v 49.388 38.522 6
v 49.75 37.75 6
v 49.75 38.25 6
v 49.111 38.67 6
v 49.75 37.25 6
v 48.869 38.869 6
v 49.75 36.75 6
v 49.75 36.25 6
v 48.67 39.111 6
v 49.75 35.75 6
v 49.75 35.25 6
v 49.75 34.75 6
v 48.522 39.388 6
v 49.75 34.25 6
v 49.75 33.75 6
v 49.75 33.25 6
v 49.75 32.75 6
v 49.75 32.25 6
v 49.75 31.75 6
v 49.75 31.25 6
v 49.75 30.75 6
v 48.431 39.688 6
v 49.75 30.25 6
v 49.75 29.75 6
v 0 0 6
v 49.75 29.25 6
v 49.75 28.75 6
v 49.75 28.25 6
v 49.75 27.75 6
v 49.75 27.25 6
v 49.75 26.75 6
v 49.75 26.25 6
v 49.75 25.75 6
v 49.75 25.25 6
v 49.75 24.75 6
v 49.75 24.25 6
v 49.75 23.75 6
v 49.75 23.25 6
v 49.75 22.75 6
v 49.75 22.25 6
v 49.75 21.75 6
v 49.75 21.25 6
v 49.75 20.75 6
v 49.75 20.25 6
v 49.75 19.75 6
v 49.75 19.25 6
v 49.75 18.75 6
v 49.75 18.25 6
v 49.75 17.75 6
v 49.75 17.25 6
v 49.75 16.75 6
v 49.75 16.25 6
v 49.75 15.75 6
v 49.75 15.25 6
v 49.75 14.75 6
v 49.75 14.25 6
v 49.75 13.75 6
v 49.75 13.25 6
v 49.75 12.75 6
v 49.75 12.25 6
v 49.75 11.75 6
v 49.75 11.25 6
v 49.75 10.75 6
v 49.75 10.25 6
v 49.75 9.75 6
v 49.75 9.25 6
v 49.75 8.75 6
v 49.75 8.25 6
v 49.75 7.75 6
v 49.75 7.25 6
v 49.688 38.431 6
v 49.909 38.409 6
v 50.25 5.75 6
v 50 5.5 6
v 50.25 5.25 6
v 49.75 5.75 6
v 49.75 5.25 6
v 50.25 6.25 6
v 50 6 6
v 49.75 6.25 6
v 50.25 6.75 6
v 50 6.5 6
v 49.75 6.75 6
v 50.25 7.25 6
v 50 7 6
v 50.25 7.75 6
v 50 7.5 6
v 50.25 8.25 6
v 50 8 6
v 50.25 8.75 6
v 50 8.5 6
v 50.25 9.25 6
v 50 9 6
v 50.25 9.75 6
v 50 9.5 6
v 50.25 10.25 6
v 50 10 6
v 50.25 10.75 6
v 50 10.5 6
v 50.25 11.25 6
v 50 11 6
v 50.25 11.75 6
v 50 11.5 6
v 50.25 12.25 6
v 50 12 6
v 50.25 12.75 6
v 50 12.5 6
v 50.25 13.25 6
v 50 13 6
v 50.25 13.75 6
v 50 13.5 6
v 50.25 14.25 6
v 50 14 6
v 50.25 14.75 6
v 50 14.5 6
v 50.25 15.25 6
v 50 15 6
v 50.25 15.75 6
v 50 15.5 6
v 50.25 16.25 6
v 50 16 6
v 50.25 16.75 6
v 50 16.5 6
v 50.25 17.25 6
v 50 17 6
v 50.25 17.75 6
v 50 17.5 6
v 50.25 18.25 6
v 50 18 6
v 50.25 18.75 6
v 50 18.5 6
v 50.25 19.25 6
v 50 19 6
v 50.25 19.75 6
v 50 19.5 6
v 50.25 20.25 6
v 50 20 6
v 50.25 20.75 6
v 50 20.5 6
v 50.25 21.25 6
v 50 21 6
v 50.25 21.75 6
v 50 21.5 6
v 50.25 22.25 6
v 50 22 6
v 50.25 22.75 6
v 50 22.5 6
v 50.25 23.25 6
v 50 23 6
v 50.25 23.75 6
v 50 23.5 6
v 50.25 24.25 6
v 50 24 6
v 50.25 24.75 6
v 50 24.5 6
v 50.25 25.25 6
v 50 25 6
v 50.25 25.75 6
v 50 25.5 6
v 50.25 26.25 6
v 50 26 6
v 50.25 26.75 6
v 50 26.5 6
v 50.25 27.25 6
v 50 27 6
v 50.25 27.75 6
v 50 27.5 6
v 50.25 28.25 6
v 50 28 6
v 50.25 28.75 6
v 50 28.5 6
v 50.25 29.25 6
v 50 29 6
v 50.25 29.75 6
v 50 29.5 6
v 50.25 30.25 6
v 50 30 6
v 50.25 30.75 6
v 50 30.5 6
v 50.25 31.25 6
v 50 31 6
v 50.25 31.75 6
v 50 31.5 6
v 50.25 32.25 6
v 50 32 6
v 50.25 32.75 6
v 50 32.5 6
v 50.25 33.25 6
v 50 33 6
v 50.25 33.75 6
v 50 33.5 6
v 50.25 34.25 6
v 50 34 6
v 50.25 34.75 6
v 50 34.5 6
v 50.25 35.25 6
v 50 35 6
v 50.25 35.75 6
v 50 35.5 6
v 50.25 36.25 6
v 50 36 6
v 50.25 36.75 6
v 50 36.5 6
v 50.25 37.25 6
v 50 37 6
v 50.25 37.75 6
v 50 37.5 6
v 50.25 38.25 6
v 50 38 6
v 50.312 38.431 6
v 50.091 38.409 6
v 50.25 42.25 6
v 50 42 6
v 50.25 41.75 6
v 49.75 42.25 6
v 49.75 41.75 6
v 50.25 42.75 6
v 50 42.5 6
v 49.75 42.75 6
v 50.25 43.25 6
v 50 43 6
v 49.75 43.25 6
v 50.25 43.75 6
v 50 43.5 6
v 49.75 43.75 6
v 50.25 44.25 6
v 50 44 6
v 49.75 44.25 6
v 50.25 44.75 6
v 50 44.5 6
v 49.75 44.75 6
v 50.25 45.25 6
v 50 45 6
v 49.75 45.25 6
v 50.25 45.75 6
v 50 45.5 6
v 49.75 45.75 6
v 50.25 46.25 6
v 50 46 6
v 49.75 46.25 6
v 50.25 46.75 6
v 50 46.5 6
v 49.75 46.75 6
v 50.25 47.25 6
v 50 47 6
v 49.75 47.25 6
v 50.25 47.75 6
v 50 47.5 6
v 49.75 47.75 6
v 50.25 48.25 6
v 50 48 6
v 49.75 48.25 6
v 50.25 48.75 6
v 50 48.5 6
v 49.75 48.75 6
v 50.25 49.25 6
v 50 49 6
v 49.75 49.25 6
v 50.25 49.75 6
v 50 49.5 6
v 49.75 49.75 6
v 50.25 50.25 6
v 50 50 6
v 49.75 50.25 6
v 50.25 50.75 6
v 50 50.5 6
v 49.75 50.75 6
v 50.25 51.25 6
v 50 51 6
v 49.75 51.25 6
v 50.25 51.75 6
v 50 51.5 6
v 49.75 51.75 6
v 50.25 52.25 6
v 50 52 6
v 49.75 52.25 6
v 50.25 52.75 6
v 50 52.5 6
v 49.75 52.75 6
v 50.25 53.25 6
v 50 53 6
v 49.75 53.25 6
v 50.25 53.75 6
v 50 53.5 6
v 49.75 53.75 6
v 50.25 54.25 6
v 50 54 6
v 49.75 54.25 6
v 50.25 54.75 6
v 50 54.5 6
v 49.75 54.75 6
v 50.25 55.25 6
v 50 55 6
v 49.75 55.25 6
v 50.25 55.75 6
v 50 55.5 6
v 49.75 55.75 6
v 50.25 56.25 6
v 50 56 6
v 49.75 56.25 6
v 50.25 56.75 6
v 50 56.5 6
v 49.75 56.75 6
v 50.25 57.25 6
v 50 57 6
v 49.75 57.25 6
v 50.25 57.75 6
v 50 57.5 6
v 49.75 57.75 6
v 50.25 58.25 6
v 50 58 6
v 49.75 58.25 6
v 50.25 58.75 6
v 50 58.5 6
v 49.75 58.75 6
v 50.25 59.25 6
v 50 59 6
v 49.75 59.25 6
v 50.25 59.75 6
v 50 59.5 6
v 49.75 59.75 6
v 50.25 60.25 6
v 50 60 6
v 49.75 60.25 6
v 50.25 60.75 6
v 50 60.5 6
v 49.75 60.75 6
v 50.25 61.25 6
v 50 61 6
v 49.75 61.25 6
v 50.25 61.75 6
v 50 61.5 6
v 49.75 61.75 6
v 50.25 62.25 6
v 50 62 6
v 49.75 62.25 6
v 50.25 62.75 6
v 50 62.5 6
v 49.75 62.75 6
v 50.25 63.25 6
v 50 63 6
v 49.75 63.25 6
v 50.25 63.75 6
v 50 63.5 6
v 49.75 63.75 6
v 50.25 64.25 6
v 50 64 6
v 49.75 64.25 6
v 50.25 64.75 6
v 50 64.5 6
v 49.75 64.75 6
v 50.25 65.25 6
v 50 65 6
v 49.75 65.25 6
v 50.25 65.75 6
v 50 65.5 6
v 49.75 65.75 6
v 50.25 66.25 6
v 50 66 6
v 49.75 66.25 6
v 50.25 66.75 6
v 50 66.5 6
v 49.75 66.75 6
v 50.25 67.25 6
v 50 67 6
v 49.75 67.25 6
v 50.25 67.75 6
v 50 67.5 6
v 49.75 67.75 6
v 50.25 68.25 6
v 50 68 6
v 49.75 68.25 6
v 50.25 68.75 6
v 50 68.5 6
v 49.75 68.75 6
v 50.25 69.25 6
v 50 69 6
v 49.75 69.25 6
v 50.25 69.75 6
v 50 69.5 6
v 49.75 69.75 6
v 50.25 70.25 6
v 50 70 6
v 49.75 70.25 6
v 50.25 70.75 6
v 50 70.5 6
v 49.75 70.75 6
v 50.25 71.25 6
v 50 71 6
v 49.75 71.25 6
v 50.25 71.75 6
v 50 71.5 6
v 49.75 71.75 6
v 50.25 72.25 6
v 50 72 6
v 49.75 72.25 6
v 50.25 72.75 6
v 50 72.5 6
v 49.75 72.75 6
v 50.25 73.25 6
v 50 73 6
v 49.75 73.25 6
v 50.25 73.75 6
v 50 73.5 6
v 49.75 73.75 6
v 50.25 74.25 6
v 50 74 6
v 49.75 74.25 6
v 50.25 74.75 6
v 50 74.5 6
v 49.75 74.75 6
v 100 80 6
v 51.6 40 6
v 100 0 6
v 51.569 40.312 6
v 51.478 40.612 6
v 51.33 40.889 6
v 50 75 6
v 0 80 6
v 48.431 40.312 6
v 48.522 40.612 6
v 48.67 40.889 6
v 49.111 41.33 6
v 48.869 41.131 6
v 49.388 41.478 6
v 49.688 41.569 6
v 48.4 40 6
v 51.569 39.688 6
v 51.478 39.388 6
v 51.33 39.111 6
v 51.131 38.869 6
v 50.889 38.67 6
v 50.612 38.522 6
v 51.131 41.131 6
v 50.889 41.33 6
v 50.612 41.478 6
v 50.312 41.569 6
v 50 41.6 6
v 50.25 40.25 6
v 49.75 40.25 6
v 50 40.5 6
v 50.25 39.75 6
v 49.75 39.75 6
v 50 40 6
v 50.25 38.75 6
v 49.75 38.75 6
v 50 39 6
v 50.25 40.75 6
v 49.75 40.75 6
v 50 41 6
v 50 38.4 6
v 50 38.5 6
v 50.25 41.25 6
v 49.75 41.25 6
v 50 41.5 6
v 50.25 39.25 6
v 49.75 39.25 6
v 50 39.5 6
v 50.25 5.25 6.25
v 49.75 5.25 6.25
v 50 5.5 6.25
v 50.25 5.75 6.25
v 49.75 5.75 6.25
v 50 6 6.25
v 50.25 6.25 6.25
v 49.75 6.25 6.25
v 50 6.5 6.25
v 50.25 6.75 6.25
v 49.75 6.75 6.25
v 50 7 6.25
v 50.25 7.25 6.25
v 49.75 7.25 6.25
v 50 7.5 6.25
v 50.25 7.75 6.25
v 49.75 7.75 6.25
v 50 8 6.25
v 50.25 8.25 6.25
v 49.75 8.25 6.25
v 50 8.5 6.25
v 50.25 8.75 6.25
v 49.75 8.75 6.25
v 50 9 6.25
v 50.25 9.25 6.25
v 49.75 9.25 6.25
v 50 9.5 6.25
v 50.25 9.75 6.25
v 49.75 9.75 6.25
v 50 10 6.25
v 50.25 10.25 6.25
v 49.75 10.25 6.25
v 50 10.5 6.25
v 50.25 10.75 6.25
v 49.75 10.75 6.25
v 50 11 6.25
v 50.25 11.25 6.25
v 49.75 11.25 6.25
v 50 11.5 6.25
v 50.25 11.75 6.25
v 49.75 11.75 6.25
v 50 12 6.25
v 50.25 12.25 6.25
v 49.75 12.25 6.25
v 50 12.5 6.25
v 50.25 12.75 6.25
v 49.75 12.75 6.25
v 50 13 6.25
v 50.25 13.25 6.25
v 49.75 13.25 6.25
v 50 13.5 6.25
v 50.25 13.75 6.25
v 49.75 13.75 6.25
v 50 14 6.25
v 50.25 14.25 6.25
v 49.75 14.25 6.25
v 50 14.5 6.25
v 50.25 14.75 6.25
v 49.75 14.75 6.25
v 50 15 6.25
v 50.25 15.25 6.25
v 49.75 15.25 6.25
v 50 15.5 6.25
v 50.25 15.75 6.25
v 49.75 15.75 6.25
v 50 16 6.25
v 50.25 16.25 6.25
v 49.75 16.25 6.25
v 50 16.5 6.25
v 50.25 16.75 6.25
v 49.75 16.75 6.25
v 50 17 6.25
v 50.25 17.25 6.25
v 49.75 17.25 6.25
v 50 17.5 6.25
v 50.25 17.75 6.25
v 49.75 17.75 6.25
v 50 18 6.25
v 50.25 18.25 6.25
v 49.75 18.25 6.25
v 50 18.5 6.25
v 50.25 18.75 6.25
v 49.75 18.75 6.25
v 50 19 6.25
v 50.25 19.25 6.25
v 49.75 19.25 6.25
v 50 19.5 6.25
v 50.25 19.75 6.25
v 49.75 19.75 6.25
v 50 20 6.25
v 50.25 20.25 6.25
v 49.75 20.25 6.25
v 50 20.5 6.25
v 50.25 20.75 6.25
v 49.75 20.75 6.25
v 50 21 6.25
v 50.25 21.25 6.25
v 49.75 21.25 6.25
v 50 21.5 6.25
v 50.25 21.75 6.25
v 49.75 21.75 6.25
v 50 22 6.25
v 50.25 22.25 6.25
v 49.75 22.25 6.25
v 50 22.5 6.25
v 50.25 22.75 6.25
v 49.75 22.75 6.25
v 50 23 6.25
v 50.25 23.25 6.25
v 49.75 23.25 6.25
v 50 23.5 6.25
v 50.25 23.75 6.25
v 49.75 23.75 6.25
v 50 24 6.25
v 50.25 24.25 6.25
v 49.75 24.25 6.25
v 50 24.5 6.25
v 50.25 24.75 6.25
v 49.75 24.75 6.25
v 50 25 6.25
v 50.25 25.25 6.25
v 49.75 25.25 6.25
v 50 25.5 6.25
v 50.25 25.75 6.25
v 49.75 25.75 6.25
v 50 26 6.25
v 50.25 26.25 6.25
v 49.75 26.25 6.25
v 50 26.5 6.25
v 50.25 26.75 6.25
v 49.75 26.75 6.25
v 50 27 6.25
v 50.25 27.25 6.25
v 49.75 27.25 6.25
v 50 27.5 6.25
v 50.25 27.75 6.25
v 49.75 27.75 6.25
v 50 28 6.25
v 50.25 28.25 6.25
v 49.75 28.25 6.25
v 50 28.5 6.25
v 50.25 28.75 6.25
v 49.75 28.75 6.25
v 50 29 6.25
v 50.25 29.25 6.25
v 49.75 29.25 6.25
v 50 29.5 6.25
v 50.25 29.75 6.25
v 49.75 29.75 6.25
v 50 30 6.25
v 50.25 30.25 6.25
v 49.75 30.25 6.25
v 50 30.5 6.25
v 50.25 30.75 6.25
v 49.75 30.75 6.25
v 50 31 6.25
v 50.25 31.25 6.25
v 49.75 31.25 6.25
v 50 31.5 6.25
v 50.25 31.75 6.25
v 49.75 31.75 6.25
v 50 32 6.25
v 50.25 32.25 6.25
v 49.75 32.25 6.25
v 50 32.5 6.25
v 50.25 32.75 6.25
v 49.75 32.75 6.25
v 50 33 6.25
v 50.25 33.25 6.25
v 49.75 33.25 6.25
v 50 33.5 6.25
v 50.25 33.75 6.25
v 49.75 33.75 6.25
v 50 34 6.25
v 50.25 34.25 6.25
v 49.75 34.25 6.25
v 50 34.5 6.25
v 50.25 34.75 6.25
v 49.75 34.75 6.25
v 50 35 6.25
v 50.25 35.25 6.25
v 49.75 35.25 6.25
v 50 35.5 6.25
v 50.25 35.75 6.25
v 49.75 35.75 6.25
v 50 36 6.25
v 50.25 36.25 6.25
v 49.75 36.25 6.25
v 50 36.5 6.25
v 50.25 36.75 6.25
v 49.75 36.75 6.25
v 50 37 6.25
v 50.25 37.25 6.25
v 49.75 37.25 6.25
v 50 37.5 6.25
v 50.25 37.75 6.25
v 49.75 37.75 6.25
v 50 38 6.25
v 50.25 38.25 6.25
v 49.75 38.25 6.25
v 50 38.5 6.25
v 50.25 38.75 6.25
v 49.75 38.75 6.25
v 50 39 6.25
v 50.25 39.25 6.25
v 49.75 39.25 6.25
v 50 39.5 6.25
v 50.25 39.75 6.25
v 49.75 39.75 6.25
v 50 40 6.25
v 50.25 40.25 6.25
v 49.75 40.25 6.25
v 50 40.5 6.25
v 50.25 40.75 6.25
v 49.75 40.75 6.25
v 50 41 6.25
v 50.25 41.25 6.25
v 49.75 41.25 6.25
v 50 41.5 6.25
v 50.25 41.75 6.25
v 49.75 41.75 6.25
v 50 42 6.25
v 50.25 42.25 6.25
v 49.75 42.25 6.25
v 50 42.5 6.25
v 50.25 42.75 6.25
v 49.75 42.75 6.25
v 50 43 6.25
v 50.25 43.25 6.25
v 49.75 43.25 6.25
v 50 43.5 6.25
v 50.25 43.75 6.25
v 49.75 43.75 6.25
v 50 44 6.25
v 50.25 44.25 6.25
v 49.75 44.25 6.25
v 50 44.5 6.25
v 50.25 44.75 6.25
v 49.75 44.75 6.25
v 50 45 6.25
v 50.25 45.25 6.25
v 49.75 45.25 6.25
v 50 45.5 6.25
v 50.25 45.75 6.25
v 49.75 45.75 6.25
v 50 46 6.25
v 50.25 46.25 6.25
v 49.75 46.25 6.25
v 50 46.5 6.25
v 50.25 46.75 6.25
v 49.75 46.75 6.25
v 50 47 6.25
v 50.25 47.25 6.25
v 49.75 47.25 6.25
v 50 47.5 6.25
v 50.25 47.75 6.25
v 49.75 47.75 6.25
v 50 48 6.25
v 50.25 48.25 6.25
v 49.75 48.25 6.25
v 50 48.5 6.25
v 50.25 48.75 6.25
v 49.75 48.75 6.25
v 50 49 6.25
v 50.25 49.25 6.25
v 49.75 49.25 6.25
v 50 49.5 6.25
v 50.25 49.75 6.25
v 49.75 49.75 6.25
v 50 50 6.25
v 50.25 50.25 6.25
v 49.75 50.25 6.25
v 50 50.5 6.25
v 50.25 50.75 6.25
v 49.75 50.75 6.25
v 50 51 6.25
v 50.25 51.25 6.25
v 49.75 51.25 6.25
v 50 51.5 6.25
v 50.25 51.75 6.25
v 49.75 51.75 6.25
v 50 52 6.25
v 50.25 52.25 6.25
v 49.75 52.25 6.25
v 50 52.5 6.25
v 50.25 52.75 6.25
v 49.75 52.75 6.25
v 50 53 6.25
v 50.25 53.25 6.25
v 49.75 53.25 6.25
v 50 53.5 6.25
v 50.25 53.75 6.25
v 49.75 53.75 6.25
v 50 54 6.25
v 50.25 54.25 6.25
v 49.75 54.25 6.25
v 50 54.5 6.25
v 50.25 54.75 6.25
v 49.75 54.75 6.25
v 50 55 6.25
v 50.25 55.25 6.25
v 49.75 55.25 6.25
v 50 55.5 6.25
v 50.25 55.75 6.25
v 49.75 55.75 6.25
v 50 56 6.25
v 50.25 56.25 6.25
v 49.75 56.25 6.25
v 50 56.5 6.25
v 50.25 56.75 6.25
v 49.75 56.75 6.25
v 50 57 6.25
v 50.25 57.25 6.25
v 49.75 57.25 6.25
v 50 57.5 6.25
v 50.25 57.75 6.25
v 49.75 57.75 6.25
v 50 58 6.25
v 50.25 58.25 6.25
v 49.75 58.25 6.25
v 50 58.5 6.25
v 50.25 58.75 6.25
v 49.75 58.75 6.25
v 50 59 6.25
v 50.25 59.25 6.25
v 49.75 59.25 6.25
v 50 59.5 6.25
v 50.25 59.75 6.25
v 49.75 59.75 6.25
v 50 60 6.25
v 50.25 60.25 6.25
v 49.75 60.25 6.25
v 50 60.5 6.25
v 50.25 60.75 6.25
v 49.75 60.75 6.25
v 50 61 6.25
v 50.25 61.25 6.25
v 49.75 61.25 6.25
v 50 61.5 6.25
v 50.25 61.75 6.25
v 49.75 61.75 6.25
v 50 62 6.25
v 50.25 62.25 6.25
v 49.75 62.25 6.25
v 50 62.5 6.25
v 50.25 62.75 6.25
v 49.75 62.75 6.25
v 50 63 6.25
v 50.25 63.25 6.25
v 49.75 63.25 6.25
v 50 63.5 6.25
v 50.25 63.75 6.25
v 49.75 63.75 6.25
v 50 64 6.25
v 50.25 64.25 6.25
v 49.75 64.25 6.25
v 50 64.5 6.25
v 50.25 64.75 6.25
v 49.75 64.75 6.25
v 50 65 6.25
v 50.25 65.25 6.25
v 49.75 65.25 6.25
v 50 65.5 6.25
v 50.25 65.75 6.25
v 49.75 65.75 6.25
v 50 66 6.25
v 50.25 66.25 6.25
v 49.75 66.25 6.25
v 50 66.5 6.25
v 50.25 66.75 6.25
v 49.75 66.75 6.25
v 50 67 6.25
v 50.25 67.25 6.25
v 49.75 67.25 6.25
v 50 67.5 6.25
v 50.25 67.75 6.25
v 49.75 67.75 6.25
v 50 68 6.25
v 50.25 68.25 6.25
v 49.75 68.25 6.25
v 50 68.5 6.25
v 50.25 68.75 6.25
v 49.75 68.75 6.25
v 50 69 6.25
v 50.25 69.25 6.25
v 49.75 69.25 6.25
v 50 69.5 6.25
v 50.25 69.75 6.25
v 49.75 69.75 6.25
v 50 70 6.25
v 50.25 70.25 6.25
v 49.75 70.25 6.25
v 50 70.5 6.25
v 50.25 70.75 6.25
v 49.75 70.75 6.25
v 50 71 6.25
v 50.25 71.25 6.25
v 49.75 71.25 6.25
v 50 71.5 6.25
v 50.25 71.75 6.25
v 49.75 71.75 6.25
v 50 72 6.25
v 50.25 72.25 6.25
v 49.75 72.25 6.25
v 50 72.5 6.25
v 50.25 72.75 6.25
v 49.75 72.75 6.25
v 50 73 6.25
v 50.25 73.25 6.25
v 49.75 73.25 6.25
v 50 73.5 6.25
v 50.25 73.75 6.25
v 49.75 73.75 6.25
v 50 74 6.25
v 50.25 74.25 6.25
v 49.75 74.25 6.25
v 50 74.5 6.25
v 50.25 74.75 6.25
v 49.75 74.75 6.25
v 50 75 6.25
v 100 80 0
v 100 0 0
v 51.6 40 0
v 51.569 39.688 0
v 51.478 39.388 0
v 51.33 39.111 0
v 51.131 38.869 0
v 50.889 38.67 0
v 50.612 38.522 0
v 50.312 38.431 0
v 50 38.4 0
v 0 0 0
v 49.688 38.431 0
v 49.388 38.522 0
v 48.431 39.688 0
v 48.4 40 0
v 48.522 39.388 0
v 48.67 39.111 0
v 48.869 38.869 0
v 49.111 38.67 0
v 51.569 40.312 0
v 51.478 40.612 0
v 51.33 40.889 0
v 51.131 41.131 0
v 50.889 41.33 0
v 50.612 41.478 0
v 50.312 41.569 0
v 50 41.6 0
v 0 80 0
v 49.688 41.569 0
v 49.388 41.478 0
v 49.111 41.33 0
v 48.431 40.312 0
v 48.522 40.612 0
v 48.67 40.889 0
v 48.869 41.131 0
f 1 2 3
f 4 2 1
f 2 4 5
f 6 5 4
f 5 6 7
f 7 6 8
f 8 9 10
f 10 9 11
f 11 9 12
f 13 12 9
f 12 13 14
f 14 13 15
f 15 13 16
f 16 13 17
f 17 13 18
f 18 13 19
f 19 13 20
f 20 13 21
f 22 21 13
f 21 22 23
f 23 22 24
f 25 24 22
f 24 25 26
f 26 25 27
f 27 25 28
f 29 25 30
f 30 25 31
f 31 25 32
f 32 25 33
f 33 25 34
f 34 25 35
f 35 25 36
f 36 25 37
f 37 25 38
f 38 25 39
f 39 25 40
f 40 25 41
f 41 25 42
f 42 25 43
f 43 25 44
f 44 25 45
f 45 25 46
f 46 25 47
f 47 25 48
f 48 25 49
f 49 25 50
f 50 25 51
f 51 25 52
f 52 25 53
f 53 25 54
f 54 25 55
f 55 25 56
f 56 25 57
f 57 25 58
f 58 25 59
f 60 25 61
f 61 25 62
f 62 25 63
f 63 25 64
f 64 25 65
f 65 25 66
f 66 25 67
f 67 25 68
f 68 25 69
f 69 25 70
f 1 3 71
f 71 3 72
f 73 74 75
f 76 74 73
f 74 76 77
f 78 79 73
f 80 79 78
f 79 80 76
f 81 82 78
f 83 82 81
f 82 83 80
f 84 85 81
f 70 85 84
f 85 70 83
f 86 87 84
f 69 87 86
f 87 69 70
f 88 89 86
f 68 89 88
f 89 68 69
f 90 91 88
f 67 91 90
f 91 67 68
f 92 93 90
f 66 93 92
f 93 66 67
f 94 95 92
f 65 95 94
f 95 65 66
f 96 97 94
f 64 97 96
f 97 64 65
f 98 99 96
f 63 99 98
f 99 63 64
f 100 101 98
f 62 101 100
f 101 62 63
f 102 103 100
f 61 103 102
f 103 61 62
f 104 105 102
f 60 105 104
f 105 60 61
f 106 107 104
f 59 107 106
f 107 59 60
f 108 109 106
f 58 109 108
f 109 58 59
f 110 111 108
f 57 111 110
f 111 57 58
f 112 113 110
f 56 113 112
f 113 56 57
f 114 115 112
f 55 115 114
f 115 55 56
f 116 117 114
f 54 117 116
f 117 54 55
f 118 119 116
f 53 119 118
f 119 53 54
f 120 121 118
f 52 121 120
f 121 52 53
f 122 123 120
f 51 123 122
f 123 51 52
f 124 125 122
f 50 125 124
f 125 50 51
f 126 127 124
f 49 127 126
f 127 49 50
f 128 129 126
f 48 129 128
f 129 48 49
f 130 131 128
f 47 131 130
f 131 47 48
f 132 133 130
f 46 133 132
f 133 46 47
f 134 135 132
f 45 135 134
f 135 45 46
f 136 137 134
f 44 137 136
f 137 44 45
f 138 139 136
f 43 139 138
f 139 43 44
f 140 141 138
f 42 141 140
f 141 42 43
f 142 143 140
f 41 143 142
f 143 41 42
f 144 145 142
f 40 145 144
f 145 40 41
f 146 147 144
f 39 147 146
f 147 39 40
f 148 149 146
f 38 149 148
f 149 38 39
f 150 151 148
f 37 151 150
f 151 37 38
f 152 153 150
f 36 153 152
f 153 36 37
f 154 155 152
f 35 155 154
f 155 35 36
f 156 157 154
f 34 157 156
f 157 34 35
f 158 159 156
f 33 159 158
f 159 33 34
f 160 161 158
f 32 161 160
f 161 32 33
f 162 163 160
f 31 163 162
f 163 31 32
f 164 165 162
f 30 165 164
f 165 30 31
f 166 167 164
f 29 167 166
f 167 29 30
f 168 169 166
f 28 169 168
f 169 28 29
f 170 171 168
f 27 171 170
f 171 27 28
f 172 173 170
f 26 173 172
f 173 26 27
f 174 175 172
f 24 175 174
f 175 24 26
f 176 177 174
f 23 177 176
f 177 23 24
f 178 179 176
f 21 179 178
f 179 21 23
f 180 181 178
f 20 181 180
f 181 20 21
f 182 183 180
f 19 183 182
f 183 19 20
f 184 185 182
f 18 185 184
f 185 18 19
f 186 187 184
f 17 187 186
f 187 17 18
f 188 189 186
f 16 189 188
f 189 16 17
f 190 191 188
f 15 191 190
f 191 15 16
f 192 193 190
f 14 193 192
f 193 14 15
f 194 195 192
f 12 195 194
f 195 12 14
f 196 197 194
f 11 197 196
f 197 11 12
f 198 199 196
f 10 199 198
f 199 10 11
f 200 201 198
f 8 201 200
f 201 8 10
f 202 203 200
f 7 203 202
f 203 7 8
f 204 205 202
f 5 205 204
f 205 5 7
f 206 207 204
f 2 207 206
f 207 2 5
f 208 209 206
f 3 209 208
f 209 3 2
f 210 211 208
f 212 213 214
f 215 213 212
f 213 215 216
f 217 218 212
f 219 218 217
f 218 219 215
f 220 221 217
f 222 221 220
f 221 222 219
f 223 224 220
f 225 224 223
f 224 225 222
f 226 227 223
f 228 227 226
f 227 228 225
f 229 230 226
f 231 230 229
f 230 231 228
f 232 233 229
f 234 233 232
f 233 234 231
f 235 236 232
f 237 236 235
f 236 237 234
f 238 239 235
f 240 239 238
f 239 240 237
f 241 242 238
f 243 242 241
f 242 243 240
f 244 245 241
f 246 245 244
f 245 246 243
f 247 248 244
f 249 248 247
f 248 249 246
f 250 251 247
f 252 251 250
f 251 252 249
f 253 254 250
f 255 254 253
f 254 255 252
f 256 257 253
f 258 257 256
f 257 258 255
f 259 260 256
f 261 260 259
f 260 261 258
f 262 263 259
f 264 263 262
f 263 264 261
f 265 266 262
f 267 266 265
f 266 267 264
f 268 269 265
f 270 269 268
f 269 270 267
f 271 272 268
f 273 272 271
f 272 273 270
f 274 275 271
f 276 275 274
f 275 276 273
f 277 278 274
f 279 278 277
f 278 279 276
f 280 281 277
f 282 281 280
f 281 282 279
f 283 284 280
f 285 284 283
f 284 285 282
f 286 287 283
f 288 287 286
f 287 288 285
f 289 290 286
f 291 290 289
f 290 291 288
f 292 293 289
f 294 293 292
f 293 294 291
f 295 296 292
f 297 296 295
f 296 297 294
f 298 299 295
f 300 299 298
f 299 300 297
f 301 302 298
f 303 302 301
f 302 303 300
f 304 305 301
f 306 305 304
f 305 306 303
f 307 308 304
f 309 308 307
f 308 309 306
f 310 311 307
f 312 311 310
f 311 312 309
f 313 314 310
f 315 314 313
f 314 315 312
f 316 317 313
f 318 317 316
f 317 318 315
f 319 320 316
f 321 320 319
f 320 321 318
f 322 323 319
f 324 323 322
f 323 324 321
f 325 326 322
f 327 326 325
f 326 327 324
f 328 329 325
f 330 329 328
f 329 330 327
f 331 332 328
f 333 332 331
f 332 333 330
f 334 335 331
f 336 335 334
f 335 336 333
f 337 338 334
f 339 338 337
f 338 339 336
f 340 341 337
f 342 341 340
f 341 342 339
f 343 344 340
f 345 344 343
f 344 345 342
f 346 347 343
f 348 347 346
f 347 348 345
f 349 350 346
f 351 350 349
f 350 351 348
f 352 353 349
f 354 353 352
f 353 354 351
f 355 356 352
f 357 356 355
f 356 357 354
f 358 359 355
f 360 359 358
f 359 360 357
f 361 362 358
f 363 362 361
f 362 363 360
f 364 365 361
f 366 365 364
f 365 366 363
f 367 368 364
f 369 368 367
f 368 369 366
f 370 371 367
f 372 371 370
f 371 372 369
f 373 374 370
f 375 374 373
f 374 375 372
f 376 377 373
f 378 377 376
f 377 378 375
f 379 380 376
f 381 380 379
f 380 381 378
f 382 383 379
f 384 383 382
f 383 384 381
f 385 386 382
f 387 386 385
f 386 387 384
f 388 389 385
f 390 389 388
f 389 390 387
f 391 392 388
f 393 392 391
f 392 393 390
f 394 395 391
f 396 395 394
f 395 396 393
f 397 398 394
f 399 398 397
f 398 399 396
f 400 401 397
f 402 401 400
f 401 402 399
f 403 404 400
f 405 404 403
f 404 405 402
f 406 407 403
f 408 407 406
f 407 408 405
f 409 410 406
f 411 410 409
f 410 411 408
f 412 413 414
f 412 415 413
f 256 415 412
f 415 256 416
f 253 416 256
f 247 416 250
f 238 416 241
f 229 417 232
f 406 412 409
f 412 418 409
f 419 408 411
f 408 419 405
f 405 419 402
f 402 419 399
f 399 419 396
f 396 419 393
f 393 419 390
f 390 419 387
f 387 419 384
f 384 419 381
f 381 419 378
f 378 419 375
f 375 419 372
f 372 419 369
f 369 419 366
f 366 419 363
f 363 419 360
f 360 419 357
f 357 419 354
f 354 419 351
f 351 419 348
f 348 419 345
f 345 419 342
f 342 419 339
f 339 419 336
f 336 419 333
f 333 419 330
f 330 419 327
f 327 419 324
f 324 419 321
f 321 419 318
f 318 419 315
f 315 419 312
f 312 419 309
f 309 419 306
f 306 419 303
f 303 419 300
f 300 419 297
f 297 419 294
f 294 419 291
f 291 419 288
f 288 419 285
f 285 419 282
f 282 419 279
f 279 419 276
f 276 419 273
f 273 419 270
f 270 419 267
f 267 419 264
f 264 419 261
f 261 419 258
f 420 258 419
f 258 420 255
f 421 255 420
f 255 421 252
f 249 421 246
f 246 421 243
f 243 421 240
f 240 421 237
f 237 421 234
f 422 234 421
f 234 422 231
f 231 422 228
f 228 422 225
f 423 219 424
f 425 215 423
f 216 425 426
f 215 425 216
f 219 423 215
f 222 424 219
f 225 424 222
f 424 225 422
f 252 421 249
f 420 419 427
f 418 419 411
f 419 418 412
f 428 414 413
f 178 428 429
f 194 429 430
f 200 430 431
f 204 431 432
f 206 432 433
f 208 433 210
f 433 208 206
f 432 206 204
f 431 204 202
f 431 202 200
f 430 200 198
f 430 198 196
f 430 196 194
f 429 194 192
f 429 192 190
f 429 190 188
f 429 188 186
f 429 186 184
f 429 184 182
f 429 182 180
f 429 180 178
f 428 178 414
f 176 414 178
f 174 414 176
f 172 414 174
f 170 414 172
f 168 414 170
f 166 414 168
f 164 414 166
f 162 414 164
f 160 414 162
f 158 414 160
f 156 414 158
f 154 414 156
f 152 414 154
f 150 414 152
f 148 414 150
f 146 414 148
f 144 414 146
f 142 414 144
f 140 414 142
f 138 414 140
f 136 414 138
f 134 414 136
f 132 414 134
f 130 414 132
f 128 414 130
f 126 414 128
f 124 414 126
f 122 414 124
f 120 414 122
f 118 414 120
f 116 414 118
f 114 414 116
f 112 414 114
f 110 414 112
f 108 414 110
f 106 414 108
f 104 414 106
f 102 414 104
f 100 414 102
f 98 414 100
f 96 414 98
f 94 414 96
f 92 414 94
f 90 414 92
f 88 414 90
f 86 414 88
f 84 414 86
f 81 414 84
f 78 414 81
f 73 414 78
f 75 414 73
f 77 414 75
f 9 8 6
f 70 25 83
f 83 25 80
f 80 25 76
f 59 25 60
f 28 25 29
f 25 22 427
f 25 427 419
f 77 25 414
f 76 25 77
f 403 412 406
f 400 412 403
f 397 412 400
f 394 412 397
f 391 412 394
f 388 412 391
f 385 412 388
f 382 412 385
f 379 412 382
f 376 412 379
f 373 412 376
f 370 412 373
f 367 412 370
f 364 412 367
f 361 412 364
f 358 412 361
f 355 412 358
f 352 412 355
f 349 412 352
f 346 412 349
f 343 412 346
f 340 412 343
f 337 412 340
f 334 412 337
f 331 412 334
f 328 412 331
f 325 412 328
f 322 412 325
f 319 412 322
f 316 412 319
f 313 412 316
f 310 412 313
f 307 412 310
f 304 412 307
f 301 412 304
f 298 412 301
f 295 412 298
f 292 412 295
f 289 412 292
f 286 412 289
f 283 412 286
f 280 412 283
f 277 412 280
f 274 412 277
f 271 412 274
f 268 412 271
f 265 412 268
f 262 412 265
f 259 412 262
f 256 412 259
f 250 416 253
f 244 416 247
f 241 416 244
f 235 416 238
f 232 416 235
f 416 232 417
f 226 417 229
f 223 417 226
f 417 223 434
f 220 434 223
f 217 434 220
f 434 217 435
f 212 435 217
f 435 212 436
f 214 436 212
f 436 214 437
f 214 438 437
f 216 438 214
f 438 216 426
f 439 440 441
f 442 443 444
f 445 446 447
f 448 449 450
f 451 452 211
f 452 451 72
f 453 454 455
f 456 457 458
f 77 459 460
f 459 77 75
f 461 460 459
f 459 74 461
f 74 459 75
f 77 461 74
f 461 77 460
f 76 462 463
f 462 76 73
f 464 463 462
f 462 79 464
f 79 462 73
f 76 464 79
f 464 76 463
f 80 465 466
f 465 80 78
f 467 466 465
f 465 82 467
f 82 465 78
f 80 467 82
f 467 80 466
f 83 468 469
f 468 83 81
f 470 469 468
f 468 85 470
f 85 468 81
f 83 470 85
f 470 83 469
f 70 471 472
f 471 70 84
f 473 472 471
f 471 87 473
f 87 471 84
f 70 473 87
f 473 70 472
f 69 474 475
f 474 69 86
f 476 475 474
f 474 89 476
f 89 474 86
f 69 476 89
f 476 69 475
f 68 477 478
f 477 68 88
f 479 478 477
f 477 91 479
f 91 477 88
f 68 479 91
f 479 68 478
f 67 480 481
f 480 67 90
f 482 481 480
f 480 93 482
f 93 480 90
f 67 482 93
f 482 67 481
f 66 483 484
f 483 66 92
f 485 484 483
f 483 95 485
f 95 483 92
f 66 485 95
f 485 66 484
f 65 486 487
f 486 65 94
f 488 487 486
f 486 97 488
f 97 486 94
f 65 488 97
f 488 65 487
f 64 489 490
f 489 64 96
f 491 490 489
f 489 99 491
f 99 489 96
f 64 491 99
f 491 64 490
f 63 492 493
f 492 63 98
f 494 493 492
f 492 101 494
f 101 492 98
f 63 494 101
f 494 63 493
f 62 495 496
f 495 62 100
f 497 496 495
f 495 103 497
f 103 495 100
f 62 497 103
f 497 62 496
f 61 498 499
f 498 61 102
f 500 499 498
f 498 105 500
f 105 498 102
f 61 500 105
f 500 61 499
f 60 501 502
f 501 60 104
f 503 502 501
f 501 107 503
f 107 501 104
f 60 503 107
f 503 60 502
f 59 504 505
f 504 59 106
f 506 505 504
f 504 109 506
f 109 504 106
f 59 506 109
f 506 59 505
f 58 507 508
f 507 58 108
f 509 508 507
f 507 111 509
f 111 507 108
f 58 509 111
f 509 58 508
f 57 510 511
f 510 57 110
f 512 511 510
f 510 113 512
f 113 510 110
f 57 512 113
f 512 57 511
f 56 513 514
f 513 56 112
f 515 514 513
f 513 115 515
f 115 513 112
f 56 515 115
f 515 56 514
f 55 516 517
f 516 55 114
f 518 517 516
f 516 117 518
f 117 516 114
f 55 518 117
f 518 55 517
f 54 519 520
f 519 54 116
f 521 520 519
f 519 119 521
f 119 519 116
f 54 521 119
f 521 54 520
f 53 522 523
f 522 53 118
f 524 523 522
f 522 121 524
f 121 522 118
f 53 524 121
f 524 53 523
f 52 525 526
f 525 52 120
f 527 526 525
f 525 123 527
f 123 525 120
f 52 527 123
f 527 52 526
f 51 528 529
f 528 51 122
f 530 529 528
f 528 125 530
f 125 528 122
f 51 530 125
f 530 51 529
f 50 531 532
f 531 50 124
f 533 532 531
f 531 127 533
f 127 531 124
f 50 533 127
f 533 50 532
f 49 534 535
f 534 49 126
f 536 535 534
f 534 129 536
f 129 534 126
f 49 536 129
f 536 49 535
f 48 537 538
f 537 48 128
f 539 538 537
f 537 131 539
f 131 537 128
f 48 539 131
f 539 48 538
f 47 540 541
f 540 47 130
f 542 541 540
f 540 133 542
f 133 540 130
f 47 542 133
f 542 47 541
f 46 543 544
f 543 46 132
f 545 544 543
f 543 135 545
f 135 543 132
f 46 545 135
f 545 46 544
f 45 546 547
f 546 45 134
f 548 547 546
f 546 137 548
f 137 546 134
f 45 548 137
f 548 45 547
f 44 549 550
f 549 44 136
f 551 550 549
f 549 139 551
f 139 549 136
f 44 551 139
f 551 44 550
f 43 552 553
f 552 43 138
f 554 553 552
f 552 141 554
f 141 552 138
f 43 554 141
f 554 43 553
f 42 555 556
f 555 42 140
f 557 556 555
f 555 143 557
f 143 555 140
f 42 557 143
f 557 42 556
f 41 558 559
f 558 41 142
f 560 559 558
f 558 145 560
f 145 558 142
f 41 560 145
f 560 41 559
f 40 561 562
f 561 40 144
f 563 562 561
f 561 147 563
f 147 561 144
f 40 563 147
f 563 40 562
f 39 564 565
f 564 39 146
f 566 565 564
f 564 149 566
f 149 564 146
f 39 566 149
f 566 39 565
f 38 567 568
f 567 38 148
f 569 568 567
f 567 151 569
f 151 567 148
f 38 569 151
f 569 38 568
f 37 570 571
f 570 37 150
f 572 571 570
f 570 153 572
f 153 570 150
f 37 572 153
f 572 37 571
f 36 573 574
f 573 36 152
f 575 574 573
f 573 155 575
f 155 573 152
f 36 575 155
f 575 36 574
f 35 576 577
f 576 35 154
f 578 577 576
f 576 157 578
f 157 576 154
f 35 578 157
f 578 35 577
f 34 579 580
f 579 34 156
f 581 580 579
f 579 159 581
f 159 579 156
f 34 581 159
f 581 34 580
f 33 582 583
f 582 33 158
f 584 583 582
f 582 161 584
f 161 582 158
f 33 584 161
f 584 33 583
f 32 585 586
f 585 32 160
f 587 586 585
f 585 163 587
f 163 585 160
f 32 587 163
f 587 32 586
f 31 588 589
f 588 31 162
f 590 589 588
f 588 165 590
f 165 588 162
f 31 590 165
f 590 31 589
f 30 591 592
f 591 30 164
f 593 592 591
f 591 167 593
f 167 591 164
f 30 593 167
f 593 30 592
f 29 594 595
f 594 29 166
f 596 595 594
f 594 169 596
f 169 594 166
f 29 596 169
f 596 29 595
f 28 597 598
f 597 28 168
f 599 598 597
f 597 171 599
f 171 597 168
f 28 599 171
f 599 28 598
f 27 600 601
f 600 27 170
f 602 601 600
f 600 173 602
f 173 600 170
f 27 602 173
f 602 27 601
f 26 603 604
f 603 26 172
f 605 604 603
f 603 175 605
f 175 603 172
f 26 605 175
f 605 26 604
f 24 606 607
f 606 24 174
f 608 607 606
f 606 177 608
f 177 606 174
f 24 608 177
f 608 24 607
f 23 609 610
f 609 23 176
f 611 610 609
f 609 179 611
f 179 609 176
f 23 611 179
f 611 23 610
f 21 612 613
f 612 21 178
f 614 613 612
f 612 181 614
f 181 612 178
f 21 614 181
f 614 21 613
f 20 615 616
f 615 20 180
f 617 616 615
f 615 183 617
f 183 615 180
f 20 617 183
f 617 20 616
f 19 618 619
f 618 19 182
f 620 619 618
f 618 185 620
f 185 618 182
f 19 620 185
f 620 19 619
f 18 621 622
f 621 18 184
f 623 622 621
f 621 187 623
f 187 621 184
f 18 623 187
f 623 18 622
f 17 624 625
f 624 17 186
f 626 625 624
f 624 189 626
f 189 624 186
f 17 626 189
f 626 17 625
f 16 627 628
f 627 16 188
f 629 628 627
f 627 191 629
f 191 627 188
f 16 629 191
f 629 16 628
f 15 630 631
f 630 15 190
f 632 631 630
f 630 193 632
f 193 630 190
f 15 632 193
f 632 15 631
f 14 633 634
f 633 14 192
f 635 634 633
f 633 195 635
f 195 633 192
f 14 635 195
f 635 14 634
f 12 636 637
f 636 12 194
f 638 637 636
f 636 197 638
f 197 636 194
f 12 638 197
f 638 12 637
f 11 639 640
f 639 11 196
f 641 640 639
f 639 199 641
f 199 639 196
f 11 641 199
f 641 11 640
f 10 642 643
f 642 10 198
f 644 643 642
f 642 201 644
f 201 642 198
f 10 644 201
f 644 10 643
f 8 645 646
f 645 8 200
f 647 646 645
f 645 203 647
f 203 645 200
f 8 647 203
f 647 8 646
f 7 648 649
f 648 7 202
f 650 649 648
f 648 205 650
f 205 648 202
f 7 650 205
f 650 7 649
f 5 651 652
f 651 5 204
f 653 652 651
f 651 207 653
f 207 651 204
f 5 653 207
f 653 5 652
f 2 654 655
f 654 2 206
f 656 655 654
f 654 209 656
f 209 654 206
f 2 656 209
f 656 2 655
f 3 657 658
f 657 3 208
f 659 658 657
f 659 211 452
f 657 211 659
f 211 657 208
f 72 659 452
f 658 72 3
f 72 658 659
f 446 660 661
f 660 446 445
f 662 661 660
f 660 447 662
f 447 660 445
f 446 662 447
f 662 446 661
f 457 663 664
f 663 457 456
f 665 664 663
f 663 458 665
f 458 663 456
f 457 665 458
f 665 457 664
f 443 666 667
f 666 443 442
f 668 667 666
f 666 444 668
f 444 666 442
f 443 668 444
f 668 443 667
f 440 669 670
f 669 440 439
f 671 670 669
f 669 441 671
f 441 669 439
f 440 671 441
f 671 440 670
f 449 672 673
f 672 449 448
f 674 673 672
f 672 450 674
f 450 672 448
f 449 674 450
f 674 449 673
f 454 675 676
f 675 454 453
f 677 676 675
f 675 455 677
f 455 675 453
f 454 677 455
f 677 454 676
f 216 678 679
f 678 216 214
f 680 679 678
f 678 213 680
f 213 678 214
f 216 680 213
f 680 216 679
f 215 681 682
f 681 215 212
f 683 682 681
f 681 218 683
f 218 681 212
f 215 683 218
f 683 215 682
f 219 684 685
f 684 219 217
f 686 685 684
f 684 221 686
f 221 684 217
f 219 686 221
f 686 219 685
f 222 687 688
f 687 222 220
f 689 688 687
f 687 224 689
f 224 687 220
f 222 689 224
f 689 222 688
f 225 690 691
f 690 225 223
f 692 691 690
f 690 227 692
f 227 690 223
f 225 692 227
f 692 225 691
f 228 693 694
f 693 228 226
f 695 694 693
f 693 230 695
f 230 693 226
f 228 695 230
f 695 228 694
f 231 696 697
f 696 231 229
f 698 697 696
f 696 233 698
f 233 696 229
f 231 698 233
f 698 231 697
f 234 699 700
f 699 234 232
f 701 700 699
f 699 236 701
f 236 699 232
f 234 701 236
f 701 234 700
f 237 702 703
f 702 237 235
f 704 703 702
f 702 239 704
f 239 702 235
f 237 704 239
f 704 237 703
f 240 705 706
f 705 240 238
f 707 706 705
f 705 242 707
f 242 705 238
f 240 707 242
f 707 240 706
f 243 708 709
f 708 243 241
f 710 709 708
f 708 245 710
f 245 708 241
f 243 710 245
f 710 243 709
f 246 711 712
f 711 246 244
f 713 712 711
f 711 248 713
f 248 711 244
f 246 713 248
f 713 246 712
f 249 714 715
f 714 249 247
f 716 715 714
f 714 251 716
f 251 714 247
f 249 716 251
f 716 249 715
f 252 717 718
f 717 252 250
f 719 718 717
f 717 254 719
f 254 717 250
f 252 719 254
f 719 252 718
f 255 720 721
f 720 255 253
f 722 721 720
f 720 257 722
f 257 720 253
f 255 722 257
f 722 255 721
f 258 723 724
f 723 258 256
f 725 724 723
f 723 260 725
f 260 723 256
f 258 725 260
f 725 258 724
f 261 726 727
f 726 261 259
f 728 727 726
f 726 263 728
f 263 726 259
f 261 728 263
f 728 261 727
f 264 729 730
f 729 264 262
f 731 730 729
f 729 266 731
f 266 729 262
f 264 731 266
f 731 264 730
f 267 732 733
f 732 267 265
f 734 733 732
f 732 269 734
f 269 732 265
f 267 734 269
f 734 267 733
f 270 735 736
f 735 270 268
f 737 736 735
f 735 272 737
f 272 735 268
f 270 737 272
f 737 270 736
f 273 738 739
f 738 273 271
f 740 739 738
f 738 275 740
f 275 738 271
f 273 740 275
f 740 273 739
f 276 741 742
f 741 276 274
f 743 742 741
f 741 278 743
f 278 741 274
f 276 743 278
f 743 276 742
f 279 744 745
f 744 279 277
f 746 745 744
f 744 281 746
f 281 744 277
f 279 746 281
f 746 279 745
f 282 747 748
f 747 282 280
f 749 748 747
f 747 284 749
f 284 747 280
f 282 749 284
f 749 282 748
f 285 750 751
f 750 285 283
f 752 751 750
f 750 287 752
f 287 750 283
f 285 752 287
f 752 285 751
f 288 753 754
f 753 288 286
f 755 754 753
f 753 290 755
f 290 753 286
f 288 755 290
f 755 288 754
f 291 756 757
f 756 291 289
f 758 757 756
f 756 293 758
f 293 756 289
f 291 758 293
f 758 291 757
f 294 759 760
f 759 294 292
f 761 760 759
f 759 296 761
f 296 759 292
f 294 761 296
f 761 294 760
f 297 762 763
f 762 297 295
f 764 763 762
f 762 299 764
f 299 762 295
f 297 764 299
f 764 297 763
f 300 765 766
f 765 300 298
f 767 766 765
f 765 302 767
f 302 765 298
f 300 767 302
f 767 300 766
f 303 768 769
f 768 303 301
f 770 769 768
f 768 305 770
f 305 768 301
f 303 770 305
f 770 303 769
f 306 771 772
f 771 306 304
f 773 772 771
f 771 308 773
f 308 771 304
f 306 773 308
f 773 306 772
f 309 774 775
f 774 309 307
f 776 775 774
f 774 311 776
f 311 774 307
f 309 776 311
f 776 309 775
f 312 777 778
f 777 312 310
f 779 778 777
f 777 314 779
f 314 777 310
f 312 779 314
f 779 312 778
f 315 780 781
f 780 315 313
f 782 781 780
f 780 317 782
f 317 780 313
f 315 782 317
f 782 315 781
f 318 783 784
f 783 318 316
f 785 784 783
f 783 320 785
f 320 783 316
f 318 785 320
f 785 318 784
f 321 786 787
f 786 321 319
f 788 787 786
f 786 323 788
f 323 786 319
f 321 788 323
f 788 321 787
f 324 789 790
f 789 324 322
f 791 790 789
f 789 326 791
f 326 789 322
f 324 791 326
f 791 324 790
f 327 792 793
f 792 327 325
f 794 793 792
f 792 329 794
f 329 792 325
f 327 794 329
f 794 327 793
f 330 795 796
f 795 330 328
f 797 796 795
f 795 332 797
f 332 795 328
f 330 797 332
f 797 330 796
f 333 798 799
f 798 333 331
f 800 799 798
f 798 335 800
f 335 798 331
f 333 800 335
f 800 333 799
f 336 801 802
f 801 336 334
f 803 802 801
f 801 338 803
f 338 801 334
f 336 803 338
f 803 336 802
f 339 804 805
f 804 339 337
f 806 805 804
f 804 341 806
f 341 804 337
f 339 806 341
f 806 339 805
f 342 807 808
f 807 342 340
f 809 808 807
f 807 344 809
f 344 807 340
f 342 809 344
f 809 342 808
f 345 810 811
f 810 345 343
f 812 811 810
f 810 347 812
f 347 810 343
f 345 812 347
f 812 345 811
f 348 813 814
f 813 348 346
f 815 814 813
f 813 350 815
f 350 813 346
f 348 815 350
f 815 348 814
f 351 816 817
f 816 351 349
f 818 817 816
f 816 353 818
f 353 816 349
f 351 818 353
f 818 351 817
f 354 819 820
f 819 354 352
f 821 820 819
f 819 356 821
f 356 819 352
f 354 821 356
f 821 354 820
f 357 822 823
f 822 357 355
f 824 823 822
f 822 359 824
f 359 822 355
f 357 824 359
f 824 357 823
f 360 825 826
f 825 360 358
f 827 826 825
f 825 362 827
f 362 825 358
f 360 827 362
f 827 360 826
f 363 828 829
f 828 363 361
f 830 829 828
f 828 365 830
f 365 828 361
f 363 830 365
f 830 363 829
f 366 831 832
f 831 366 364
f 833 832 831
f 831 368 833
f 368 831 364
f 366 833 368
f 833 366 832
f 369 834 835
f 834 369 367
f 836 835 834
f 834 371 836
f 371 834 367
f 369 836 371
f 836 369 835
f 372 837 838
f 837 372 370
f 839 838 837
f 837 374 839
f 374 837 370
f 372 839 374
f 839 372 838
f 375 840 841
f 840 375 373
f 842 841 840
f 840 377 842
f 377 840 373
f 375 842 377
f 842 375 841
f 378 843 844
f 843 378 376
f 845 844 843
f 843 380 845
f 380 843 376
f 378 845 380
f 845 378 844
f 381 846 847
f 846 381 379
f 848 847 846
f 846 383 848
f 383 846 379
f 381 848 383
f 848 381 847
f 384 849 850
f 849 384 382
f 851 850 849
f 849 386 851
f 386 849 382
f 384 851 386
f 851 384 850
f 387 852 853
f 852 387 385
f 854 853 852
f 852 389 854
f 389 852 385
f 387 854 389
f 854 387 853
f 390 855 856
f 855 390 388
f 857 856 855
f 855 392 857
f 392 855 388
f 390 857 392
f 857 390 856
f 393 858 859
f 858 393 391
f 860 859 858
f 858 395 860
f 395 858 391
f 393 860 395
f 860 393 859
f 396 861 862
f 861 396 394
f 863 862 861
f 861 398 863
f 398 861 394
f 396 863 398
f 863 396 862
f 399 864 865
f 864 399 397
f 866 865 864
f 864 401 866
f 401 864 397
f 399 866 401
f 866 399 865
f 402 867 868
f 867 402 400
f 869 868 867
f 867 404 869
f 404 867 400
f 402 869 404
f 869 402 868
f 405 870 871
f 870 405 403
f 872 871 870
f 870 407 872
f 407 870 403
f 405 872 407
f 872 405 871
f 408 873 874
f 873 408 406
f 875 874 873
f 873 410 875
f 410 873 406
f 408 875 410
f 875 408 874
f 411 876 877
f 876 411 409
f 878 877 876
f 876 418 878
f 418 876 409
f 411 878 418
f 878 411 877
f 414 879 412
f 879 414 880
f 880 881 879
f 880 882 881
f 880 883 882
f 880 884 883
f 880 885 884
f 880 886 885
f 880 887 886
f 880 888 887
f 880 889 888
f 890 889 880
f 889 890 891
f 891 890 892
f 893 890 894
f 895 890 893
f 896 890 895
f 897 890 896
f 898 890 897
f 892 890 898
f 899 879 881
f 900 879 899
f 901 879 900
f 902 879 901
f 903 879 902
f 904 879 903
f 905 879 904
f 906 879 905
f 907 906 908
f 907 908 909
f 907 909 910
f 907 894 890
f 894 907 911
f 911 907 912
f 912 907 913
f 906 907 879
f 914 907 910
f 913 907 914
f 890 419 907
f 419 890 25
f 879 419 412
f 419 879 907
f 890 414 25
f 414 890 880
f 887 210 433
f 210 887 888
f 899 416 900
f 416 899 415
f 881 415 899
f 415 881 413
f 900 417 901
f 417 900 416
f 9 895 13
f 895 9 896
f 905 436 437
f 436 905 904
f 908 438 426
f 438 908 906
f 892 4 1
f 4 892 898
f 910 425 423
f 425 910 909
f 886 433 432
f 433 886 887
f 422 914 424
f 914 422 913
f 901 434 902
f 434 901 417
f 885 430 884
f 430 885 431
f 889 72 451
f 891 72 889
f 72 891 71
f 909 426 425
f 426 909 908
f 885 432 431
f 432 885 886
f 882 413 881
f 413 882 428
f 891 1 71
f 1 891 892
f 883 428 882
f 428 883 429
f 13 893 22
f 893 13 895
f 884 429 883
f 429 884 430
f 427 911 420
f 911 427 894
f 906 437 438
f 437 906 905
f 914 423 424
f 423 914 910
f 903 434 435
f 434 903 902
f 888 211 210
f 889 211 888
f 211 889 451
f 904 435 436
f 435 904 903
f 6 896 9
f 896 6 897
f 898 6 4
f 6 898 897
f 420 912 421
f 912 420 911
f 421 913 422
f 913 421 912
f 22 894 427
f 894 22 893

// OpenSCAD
// Parametric riblet test coupon (V-groove or blade cross-section).
// Units: mm. Set s_um/h_um in MICRONS; converted internally.
//
// Examples:
//   A-V-s500-h250   : shape="v", s_um=500, h_um=250
//   A-BLAD-s200-h100: shape="blade", s_um=200, h_um=100
//
// Render with F6 at 0.01 mm resolution before exporting STL.

shape        = "v";          // "v" | "blade"
s_um         = 500;
h_um         = 250;
plate_w_mm   = 100;          // flow direction
plate_l_mm   = 80;           // spanwise (grooves run along this axis)
thickness_mm = 6;
border_mm    = 5;            // plain border around textured field

s = s_um / 1000;
h = h_um / 1000;
n_grooves = floor((plate_l_mm - 2 * border_mm) / s);
field_l   = n_grooves * s;

module v_groove_pair() {
    // one V tooth of base width s, height h, on the plate surface
    translate([0, 0, thickness_mm])
        linear_extrude(height = h)
            polygon(points=[[-s/2, 0], [s/2, 0], [0, h]]);
}

module blade_riblet() {
    // blade: thin fin, tip width ~ min(0.05*s, 0.05*h) with 8 deg draft
    tip_w = min(0.05 * s, 0.05 * h);
    base_w = tip_w + 2 * h * tan(4);
    translate([0, 0, thickness_mm])
        linear_extrude(height = h)
            polygon(points=[[-base_w/2, 0], [base_w/2, 0],
                            [tip_w/2, h], [-tip_w/2, h]]);
}

difference() {
    union() {
        cube([plate_w_mm, plate_l_mm, thickness_mm]);
        for (i = [0 : n_grooves - 1]) {
            y0 = (plate_l_mm - field_l) / 2 + i * s + s/2;
            translate([plate_w_mm/2, y0, 0])
                if (shape == "v") { v_groove_pair(); }
                else { blade_riblet(); }
        }
    }
    // alignment hole for the splitter-plate mounting screw
    translate([plate_w_mm/2, plate_l_mm/2, 0])
        cylinder(h = thickness_mm, d = 3.2, $fn = 32);
}

echo(str("grooves: ", n_grooves, "  pitch: ", s, " mm  height: ", h,
         " mm  textured field: ", plate_w_mm - 2*border_mm, " x ", field_l, " mm"));
